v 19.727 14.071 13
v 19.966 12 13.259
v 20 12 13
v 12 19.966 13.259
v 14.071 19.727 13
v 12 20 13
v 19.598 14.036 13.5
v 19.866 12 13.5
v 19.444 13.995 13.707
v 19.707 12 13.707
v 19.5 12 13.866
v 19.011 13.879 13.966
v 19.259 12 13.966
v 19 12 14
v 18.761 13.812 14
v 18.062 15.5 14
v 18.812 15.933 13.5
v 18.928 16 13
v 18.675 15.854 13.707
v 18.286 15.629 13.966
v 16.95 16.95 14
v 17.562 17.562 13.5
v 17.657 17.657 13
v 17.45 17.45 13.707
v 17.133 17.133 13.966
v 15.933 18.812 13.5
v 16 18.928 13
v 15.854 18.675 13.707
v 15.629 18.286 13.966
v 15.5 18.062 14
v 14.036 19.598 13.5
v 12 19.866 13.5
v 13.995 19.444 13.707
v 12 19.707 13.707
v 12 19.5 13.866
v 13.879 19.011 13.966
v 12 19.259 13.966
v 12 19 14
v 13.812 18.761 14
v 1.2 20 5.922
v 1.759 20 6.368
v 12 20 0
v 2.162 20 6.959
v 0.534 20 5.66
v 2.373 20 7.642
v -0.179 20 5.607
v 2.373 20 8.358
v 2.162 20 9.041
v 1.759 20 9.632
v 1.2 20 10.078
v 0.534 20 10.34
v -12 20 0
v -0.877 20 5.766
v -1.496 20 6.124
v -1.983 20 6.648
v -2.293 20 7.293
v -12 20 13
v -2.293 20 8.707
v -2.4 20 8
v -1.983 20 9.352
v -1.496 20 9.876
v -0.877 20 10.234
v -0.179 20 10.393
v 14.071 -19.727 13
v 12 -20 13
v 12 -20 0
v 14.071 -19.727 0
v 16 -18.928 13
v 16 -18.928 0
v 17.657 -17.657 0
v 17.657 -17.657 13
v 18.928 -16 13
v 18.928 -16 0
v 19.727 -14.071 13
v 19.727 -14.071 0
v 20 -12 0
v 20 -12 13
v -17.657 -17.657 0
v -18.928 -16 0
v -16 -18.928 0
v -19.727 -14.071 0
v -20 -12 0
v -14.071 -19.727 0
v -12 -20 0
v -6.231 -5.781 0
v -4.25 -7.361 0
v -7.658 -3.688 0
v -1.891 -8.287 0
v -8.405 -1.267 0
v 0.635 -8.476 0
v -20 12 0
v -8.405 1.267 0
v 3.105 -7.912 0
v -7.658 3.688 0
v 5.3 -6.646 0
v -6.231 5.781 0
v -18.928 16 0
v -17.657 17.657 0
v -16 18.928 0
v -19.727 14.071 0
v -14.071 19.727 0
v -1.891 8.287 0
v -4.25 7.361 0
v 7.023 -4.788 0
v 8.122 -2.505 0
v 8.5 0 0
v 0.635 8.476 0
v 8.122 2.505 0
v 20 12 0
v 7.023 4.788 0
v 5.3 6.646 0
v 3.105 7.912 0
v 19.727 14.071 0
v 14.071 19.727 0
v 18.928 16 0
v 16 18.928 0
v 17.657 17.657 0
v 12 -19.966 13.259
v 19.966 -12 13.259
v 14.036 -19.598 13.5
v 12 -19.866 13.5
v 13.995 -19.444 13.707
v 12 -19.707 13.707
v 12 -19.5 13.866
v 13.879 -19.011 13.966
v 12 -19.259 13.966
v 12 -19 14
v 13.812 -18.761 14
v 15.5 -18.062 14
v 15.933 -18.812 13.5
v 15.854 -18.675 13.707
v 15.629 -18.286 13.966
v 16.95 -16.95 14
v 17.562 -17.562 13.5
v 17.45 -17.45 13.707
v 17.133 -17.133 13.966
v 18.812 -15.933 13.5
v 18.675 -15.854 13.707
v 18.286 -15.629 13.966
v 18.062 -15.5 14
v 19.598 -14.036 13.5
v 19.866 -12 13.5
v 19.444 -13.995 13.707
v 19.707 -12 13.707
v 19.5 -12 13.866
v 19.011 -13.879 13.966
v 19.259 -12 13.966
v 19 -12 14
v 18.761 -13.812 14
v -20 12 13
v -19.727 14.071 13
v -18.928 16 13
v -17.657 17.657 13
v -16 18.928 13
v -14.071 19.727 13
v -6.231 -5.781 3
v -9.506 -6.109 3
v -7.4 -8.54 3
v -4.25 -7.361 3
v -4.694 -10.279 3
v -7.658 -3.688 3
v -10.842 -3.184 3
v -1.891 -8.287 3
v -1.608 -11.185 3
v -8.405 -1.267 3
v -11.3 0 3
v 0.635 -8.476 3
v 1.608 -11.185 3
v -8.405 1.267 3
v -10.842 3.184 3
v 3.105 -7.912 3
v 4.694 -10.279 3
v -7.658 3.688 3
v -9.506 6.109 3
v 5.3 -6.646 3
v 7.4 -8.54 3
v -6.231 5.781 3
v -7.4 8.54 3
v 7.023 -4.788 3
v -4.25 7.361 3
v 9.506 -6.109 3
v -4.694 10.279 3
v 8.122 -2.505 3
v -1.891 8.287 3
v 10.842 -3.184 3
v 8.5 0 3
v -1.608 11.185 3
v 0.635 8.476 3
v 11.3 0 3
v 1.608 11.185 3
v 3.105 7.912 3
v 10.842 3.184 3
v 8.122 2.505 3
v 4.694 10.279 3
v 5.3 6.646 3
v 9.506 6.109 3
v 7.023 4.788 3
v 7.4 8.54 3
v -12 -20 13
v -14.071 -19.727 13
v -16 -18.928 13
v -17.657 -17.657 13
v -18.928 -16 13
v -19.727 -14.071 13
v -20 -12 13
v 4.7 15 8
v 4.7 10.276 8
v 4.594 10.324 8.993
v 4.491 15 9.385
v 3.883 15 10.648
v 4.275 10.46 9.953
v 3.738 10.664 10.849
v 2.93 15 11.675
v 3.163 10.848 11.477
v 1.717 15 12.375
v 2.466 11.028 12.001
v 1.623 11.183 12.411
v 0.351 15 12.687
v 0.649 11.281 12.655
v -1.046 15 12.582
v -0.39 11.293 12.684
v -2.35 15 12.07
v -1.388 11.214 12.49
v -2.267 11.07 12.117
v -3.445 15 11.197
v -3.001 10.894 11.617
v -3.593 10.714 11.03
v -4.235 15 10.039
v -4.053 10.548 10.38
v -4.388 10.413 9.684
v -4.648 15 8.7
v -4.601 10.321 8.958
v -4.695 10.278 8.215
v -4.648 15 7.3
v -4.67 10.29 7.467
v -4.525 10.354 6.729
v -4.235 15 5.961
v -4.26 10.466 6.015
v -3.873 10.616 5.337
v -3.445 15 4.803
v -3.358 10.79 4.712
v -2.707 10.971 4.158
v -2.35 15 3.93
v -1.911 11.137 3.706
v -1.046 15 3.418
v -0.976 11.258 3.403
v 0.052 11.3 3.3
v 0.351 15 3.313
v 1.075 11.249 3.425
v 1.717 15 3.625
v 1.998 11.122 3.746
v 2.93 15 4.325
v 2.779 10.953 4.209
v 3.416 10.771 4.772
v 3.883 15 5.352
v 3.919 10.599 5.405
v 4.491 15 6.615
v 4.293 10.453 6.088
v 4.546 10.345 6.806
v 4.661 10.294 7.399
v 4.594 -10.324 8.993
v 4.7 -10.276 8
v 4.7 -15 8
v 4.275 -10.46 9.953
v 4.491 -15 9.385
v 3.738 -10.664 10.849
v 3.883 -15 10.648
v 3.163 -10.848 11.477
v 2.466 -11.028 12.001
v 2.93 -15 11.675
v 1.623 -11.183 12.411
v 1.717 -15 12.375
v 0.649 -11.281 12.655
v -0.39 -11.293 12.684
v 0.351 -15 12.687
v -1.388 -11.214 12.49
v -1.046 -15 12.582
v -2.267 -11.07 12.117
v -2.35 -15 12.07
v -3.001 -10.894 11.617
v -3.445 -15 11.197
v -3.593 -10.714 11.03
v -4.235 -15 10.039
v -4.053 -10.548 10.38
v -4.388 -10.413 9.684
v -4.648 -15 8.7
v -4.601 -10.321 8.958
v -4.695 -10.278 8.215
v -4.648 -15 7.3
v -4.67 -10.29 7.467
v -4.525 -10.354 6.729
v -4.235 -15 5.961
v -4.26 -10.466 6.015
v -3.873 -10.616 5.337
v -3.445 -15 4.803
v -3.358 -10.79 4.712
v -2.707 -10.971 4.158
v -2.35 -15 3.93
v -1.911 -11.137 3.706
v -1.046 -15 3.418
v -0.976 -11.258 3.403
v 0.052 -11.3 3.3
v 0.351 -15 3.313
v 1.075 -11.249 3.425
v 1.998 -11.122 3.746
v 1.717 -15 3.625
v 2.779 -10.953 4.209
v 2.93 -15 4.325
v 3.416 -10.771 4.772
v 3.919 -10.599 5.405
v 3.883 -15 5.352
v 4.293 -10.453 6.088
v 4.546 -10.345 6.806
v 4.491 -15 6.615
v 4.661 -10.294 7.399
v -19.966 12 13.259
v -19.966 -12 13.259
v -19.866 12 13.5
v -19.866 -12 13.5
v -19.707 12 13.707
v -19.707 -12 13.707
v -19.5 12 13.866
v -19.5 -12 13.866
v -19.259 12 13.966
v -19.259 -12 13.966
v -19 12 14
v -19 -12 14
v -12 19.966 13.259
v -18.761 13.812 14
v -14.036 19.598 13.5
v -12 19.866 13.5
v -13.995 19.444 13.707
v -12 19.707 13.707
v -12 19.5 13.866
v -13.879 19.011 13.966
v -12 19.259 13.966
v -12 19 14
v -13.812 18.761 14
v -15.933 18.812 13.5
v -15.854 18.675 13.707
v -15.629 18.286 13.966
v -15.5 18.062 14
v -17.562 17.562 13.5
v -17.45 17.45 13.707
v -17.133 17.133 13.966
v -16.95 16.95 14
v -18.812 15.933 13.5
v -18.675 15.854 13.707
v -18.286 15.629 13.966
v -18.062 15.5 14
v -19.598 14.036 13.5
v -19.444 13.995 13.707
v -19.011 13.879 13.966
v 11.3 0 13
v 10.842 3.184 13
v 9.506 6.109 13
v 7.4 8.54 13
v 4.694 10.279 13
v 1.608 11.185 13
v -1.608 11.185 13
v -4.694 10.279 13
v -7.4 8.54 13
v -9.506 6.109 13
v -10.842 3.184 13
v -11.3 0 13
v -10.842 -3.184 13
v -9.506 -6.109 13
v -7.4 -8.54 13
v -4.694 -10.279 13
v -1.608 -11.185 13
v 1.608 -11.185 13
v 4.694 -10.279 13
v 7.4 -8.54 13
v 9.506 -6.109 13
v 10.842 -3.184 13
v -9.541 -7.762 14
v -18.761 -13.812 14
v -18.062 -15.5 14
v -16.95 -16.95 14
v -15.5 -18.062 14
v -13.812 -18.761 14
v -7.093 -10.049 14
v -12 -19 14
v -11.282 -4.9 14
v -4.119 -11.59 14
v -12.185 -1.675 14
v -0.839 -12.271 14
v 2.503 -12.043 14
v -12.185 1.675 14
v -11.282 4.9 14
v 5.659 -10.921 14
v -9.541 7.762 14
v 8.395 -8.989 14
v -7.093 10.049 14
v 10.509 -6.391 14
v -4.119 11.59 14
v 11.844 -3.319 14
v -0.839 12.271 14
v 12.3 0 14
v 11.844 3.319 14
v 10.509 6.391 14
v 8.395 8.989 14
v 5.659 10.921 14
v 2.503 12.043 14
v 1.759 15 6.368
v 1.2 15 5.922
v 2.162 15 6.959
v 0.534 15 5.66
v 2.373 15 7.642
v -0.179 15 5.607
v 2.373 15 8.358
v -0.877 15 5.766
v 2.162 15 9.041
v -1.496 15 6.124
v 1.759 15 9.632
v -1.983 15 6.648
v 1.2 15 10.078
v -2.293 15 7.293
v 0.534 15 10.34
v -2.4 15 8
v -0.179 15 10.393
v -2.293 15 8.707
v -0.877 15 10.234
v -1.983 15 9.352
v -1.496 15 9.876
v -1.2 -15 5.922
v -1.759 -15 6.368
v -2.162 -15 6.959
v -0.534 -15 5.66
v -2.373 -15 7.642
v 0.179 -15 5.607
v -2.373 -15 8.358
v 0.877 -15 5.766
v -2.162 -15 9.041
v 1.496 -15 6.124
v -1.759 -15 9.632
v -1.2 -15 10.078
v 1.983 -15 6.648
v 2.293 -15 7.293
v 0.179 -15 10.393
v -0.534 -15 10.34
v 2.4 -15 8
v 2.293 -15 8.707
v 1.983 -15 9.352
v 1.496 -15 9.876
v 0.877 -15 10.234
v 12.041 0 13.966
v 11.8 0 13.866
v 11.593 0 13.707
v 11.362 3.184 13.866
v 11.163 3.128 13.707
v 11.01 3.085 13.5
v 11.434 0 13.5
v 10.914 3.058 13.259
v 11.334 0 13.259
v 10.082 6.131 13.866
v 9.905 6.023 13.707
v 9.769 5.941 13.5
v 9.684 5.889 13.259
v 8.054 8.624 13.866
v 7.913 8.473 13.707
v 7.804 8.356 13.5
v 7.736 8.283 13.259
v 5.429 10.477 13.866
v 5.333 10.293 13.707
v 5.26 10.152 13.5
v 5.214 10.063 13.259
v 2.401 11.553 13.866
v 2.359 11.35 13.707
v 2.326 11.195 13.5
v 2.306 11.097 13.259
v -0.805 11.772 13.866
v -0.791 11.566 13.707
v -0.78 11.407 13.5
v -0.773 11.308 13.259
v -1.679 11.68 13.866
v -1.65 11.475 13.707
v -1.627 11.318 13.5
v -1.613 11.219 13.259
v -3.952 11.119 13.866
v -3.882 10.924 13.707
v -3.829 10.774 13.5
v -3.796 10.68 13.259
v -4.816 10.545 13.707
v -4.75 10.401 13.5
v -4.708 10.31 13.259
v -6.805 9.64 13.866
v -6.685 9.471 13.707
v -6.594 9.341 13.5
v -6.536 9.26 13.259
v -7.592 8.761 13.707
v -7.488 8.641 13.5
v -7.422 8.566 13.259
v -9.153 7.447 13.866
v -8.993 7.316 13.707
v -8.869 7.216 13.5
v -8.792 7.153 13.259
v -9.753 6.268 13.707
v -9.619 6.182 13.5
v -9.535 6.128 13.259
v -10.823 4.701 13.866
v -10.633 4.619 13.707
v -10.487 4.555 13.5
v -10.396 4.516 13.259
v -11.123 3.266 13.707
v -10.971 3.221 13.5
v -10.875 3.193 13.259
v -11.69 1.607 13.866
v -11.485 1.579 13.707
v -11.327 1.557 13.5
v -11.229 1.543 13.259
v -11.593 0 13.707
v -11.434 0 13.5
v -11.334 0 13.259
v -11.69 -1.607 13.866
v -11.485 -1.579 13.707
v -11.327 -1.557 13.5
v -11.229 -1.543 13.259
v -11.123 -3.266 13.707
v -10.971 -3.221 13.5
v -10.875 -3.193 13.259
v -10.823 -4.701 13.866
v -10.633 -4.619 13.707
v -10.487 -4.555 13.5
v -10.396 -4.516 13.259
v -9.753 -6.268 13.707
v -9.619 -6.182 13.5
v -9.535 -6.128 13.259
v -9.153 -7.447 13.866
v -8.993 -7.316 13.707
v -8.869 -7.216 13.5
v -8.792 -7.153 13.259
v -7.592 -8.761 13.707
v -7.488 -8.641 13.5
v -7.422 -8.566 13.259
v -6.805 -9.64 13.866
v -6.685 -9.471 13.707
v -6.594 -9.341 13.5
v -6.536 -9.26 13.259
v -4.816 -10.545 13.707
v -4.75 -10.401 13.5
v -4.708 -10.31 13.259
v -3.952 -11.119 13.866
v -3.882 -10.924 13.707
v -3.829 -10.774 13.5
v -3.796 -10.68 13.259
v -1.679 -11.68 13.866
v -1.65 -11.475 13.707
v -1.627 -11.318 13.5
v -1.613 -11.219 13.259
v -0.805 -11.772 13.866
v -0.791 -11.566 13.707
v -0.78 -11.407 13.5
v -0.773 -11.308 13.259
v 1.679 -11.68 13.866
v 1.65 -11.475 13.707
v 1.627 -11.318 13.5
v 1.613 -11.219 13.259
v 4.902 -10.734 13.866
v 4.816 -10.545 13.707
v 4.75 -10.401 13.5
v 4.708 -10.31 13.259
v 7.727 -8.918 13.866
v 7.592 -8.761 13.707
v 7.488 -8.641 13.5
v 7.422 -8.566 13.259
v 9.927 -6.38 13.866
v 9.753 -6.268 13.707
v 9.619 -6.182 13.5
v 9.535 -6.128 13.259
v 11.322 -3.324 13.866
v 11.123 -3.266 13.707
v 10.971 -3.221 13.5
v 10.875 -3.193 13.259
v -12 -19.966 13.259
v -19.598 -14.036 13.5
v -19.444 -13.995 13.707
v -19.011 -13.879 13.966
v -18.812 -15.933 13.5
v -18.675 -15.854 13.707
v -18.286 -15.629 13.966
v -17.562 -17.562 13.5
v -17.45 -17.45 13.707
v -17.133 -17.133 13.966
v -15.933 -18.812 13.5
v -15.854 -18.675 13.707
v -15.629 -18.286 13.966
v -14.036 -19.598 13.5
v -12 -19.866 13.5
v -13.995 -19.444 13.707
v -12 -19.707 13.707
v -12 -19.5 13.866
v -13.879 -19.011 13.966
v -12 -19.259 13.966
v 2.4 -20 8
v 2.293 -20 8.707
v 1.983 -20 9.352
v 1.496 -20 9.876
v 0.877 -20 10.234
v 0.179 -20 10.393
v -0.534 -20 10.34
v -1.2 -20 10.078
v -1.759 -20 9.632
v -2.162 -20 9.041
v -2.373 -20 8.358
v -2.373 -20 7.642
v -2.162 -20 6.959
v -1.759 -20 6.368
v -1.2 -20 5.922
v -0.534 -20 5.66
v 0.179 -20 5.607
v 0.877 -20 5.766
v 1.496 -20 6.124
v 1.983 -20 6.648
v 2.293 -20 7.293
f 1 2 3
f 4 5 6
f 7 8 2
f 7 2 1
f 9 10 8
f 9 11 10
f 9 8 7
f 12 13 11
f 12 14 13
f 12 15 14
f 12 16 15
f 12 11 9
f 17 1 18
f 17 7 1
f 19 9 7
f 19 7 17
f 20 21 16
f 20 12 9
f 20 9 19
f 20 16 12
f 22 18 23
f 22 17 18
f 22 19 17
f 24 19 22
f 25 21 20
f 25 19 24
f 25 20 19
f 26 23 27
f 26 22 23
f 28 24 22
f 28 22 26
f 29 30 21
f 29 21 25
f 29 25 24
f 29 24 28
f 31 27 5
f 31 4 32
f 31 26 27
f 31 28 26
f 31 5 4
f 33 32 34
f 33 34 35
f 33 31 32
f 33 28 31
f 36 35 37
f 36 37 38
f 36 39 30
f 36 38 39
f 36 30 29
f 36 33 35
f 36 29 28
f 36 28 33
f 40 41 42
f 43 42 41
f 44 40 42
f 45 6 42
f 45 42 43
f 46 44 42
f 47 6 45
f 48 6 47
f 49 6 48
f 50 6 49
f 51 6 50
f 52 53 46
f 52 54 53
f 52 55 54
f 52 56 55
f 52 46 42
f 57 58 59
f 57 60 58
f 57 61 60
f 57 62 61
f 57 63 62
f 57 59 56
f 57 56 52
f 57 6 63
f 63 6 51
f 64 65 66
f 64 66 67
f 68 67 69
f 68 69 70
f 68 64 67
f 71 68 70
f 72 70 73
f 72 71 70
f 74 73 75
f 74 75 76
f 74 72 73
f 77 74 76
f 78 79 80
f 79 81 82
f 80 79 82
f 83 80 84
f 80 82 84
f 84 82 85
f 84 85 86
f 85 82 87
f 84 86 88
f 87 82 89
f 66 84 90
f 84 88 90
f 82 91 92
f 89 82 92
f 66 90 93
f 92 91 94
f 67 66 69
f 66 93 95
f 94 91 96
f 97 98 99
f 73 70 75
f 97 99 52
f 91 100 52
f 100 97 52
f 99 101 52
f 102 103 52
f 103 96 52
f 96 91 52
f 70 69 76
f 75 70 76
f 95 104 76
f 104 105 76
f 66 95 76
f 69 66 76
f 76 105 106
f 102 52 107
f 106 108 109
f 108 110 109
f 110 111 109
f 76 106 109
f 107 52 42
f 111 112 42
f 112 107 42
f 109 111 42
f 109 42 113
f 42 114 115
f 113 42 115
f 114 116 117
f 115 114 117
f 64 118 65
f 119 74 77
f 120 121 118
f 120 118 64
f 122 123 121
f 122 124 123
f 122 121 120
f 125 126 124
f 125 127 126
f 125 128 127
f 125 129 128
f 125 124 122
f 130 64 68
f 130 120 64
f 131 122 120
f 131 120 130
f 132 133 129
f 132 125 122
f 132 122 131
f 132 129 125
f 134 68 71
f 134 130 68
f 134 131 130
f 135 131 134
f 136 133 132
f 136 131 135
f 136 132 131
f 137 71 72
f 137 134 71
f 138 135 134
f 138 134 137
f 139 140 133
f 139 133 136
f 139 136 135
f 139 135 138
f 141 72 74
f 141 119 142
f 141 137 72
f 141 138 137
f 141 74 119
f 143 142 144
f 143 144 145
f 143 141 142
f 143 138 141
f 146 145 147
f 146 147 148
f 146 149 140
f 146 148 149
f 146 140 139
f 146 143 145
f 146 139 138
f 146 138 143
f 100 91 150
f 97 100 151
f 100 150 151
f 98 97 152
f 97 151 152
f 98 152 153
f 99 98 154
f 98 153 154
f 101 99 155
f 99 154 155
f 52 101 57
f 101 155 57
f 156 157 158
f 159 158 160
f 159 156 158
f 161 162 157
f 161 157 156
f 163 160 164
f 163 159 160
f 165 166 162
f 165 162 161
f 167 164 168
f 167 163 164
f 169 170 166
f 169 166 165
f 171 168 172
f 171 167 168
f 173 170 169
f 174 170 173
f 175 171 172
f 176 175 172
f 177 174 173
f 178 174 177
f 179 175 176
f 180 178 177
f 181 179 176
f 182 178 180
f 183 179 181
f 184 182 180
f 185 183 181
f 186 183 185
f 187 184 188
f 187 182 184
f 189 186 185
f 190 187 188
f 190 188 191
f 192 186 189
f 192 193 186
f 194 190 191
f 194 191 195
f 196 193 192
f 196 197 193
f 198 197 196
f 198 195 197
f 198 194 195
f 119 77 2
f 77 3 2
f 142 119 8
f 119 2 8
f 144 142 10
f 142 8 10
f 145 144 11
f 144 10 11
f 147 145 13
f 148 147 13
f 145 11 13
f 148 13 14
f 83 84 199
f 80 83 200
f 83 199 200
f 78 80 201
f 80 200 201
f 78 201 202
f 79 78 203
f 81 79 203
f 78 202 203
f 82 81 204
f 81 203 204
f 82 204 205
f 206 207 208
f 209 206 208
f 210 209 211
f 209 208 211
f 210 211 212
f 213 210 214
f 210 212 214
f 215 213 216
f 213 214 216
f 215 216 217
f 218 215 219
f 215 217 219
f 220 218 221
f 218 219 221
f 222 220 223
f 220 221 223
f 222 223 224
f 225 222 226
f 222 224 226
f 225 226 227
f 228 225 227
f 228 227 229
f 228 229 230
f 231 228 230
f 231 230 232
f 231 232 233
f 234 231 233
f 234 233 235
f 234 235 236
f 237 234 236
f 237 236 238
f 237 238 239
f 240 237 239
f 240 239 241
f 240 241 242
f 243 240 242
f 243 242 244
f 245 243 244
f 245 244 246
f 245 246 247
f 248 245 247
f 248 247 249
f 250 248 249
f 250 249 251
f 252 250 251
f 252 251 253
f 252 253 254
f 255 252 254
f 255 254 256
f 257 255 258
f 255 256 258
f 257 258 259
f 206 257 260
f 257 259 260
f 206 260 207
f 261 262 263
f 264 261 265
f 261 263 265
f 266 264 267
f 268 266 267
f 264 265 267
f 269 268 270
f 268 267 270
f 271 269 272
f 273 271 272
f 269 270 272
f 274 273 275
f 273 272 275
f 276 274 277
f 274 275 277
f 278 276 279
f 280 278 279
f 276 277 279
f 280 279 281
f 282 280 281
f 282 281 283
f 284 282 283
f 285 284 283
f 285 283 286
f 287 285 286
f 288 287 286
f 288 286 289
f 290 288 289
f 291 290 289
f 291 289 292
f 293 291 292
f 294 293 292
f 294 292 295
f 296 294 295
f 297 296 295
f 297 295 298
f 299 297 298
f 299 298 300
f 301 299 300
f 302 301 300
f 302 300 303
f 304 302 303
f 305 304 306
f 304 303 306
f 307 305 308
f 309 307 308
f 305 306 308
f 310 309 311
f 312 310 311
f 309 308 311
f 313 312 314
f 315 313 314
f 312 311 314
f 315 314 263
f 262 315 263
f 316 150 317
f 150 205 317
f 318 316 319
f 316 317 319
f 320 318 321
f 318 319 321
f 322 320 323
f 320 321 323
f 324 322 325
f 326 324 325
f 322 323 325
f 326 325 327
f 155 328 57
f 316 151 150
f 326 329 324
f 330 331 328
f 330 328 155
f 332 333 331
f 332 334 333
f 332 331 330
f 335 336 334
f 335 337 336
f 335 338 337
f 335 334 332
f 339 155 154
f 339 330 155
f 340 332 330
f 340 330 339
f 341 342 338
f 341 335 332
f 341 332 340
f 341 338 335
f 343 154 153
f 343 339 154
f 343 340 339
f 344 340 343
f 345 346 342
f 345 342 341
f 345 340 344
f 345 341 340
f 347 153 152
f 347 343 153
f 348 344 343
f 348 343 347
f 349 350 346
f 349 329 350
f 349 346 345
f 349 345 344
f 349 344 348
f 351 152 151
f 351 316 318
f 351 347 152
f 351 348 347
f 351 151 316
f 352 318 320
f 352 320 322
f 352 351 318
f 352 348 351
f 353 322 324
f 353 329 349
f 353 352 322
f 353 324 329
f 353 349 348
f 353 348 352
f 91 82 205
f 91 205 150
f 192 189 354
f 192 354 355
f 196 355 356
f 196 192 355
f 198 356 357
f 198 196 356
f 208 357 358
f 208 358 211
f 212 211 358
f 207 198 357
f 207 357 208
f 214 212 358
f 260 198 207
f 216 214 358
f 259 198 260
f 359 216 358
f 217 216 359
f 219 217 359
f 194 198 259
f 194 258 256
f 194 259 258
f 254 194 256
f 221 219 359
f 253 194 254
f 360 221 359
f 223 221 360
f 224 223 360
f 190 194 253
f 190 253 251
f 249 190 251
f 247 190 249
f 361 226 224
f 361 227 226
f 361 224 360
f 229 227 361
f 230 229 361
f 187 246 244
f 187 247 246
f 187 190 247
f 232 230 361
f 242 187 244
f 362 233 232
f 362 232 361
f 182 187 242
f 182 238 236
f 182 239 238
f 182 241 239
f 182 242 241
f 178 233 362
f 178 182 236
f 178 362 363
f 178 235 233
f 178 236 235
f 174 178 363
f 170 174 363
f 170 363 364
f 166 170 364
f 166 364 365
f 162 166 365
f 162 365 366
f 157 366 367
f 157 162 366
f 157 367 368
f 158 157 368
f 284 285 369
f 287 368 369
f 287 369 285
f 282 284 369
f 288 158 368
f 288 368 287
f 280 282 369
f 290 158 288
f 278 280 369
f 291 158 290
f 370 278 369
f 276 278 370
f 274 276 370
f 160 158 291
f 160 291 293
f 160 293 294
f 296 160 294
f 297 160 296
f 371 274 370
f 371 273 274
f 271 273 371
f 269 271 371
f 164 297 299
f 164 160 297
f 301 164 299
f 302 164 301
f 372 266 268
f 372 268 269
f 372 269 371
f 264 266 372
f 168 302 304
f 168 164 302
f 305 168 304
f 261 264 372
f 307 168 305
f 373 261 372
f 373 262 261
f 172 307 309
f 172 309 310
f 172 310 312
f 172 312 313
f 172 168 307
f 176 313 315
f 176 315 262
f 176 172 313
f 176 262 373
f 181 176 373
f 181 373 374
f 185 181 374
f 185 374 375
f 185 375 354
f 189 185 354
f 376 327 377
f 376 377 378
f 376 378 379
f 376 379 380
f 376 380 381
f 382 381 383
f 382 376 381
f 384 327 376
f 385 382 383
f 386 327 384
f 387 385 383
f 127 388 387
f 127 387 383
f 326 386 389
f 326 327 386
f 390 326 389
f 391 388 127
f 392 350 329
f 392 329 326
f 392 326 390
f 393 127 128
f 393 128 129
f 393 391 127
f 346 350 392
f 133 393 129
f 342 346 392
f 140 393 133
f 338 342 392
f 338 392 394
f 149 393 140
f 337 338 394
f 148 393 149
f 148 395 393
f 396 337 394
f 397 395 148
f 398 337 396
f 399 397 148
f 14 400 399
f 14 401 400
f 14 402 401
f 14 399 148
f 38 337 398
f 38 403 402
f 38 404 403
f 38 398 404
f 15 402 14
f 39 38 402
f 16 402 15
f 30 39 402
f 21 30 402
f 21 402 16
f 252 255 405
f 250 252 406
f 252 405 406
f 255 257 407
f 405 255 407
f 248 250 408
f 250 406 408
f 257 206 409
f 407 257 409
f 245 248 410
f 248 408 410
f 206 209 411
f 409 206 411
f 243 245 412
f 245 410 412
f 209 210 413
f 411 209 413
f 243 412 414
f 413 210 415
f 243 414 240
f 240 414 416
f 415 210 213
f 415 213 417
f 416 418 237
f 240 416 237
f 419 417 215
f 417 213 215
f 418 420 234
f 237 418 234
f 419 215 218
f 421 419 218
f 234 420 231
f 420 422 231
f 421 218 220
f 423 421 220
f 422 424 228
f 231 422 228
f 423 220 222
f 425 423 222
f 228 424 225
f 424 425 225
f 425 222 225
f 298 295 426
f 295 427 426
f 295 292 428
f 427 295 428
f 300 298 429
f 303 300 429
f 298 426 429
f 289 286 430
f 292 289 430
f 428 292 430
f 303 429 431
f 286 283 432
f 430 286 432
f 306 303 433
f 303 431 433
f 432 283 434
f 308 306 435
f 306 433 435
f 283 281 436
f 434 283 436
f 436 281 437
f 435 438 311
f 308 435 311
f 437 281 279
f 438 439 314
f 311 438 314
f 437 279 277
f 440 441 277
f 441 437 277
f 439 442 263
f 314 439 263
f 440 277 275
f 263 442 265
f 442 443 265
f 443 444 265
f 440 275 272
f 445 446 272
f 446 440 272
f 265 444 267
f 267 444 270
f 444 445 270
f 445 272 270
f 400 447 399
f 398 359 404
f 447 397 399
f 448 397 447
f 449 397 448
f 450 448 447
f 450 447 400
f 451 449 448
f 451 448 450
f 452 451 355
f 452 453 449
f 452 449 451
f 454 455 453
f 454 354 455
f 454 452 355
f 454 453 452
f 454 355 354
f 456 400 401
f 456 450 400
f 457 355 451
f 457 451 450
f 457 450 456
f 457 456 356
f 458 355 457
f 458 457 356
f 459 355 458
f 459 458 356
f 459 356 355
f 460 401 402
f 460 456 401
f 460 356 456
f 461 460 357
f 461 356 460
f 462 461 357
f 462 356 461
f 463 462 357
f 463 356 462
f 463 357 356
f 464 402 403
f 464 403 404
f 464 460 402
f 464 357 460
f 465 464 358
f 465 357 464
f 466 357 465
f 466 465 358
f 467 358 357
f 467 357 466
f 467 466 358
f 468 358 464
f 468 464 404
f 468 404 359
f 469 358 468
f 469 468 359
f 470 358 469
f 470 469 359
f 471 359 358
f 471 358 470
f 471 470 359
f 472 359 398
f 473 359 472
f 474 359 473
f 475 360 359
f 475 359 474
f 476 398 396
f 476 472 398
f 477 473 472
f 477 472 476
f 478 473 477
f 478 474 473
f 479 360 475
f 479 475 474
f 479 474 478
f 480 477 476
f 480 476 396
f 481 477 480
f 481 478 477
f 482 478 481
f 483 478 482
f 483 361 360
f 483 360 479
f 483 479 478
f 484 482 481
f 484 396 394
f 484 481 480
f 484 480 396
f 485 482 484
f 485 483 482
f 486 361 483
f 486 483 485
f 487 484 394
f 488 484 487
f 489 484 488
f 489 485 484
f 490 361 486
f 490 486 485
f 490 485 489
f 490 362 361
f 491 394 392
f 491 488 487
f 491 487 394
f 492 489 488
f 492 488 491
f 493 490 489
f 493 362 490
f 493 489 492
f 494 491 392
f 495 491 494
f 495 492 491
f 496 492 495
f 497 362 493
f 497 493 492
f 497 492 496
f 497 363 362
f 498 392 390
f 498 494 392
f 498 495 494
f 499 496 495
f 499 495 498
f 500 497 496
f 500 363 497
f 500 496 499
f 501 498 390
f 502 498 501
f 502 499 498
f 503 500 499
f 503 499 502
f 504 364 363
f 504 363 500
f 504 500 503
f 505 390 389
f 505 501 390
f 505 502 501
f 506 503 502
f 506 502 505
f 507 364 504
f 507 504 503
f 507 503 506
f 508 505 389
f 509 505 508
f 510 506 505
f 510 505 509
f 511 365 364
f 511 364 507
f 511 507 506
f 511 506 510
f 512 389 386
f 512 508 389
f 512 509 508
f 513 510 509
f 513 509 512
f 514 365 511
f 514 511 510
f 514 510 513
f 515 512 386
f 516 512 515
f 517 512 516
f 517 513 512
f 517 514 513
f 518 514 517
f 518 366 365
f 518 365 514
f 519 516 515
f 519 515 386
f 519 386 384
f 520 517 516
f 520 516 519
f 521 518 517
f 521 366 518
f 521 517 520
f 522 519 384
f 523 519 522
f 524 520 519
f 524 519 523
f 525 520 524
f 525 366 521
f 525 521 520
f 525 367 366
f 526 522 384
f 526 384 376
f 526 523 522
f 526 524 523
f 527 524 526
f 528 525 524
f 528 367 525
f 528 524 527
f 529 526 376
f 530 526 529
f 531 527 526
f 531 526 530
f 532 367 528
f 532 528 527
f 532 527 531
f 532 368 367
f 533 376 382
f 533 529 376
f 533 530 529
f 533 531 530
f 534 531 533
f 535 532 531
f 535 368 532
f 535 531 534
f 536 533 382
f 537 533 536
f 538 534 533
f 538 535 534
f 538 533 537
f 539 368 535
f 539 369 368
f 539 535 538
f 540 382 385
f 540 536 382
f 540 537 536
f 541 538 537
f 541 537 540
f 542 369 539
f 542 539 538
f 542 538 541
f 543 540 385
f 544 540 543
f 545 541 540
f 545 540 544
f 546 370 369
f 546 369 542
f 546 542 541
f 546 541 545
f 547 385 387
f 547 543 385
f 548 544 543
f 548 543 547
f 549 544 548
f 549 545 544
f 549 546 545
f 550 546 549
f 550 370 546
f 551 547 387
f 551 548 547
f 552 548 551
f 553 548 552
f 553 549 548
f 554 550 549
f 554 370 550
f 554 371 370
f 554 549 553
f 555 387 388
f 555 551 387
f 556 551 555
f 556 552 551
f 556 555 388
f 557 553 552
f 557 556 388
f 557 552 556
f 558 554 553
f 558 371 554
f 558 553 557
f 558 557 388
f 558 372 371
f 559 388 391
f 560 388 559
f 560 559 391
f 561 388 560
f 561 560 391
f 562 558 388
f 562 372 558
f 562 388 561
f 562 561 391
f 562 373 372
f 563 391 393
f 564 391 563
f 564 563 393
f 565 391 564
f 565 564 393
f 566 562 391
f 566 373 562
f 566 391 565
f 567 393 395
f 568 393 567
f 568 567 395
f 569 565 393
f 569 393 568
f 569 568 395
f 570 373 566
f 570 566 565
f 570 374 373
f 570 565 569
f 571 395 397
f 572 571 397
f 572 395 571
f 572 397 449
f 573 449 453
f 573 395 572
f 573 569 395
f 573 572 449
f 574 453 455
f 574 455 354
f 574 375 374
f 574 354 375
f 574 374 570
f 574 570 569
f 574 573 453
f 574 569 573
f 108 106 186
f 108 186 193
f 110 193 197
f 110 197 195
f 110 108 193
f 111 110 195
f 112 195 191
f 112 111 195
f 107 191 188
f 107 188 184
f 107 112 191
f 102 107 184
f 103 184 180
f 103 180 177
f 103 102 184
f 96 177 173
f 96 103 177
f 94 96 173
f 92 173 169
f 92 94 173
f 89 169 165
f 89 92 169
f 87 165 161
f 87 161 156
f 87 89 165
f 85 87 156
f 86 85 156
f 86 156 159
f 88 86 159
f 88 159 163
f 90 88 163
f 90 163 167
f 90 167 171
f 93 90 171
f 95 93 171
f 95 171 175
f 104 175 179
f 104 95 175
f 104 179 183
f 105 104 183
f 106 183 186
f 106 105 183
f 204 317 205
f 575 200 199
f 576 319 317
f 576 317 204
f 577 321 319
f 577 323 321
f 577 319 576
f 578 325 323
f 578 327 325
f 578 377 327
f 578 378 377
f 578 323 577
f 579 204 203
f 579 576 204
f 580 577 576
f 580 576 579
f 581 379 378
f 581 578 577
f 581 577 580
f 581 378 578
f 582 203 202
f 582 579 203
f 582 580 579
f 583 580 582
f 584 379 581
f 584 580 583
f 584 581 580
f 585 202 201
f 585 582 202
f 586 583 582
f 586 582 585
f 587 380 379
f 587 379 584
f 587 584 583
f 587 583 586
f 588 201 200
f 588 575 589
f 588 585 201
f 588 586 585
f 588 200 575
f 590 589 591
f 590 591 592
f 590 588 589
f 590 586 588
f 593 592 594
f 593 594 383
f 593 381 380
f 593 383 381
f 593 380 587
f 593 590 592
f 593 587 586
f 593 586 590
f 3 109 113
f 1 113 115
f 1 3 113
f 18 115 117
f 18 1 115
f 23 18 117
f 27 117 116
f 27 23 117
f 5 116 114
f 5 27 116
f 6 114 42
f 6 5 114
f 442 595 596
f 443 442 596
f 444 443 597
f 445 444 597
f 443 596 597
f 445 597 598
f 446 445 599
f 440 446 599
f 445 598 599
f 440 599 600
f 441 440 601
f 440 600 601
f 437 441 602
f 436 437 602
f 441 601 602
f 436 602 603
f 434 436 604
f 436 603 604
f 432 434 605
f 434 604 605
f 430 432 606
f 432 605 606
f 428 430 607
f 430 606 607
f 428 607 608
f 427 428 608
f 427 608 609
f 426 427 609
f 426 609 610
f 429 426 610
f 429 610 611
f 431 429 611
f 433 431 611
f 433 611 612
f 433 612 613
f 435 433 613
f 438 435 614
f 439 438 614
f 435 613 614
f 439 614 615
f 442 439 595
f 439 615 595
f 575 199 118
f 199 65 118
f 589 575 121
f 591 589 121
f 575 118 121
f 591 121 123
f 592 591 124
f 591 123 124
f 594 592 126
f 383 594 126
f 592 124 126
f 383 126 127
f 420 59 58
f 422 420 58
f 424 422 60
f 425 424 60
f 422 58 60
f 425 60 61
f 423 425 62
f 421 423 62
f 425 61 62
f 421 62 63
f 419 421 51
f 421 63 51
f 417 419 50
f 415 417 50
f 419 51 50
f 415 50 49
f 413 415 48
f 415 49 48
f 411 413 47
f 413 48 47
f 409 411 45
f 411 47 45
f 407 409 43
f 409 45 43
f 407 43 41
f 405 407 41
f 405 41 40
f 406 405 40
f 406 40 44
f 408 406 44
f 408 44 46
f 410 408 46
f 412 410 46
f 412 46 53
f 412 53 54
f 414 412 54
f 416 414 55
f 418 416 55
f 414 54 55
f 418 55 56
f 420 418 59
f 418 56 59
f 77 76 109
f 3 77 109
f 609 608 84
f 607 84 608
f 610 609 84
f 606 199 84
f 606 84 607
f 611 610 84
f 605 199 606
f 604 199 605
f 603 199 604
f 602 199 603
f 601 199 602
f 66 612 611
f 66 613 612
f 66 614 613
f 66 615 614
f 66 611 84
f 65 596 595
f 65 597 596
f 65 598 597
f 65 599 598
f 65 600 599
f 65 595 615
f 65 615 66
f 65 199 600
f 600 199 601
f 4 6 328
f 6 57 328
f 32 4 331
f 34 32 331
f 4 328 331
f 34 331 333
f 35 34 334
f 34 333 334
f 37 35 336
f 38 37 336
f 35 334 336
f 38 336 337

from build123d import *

# Parameters (mm, degrees)
F0_R     = 11.3
F0_R_2   = 8.5
F1_DEPTH = 3
F0_W     = 40
F0_H     = 40
F2_DEPTH = 14
F3_R     = 4.7
F4_DEPTH = 40.001
F5_R     = 4.7
F5_R_2   = 2.4
F6_DEPTH = 5
F7_R     = 4.7
F7_R_2   = 2.4
F8_DEPTH = 5
F9_R     = 8
F10_R    = 1


with BuildPart() as f1:
    # F0 (on Top) → F1 (new body)
    with BuildSketch(Plane.XY):
        Circle(F0_R)
        Circle(F0_R_2, mode=Mode.SUBTRACT)
    extrude(amount=F1_DEPTH)

    # F0 (on Top) → F2 (join)
    with BuildSketch(Plane.XY):
        Rectangle(F0_W, F0_H)
        Circle(F0_R, mode=Mode.SUBTRACT)
    extrude(amount=F2_DEPTH)

    # F3 (on face) → F4 (cut, through all)
    with BuildSketch(Plane.XZ.offset(20)):
        with Locations((0, 8)):
            Circle(F3_R)
    extrude(amount=-F4_DEPTH, mode=Mode.SUBTRACT)

    # F5 (on face) → F6 (join)
    with BuildSketch(Plane.XZ.offset(20)):
        with Locations((0, 8)):
            Circle(F5_R)
        with Locations((0, 8)):
            Circle(F5_R_2, mode=Mode.SUBTRACT)
    extrude(amount=-F6_DEPTH)

    # F7 (on face) → F8 (join)
    with BuildSketch(Plane(origin=(0, 20, 0), x_dir=(-1, 0, 0), z_dir=(0, 1, 0))):
        with Locations((0, 8)):
            Circle(F7_R)
        with Locations((0, 8)):
            Circle(F7_R_2, mode=Mode.SUBTRACT)
    extrude(amount=-F8_DEPTH)

    # F9
    f9_edges = [f1.edges().sort_by_distance(p)[0] for p in [
        (-20, -20, 7),
        (-20, 20, 7),
        (20, -20, 7),
        (20, 20, 7),
    ]]
    fillet(f9_edges, radius=F9_R)

    # F10
    f10_edges = [f1.edges().sort_by_distance(p)[0] for p in [
        (0, -20, 14),
        (-11.3, 0, 14),
    ]]
    fillet(f10_edges, radius=F10_R)


solid = f1.part
